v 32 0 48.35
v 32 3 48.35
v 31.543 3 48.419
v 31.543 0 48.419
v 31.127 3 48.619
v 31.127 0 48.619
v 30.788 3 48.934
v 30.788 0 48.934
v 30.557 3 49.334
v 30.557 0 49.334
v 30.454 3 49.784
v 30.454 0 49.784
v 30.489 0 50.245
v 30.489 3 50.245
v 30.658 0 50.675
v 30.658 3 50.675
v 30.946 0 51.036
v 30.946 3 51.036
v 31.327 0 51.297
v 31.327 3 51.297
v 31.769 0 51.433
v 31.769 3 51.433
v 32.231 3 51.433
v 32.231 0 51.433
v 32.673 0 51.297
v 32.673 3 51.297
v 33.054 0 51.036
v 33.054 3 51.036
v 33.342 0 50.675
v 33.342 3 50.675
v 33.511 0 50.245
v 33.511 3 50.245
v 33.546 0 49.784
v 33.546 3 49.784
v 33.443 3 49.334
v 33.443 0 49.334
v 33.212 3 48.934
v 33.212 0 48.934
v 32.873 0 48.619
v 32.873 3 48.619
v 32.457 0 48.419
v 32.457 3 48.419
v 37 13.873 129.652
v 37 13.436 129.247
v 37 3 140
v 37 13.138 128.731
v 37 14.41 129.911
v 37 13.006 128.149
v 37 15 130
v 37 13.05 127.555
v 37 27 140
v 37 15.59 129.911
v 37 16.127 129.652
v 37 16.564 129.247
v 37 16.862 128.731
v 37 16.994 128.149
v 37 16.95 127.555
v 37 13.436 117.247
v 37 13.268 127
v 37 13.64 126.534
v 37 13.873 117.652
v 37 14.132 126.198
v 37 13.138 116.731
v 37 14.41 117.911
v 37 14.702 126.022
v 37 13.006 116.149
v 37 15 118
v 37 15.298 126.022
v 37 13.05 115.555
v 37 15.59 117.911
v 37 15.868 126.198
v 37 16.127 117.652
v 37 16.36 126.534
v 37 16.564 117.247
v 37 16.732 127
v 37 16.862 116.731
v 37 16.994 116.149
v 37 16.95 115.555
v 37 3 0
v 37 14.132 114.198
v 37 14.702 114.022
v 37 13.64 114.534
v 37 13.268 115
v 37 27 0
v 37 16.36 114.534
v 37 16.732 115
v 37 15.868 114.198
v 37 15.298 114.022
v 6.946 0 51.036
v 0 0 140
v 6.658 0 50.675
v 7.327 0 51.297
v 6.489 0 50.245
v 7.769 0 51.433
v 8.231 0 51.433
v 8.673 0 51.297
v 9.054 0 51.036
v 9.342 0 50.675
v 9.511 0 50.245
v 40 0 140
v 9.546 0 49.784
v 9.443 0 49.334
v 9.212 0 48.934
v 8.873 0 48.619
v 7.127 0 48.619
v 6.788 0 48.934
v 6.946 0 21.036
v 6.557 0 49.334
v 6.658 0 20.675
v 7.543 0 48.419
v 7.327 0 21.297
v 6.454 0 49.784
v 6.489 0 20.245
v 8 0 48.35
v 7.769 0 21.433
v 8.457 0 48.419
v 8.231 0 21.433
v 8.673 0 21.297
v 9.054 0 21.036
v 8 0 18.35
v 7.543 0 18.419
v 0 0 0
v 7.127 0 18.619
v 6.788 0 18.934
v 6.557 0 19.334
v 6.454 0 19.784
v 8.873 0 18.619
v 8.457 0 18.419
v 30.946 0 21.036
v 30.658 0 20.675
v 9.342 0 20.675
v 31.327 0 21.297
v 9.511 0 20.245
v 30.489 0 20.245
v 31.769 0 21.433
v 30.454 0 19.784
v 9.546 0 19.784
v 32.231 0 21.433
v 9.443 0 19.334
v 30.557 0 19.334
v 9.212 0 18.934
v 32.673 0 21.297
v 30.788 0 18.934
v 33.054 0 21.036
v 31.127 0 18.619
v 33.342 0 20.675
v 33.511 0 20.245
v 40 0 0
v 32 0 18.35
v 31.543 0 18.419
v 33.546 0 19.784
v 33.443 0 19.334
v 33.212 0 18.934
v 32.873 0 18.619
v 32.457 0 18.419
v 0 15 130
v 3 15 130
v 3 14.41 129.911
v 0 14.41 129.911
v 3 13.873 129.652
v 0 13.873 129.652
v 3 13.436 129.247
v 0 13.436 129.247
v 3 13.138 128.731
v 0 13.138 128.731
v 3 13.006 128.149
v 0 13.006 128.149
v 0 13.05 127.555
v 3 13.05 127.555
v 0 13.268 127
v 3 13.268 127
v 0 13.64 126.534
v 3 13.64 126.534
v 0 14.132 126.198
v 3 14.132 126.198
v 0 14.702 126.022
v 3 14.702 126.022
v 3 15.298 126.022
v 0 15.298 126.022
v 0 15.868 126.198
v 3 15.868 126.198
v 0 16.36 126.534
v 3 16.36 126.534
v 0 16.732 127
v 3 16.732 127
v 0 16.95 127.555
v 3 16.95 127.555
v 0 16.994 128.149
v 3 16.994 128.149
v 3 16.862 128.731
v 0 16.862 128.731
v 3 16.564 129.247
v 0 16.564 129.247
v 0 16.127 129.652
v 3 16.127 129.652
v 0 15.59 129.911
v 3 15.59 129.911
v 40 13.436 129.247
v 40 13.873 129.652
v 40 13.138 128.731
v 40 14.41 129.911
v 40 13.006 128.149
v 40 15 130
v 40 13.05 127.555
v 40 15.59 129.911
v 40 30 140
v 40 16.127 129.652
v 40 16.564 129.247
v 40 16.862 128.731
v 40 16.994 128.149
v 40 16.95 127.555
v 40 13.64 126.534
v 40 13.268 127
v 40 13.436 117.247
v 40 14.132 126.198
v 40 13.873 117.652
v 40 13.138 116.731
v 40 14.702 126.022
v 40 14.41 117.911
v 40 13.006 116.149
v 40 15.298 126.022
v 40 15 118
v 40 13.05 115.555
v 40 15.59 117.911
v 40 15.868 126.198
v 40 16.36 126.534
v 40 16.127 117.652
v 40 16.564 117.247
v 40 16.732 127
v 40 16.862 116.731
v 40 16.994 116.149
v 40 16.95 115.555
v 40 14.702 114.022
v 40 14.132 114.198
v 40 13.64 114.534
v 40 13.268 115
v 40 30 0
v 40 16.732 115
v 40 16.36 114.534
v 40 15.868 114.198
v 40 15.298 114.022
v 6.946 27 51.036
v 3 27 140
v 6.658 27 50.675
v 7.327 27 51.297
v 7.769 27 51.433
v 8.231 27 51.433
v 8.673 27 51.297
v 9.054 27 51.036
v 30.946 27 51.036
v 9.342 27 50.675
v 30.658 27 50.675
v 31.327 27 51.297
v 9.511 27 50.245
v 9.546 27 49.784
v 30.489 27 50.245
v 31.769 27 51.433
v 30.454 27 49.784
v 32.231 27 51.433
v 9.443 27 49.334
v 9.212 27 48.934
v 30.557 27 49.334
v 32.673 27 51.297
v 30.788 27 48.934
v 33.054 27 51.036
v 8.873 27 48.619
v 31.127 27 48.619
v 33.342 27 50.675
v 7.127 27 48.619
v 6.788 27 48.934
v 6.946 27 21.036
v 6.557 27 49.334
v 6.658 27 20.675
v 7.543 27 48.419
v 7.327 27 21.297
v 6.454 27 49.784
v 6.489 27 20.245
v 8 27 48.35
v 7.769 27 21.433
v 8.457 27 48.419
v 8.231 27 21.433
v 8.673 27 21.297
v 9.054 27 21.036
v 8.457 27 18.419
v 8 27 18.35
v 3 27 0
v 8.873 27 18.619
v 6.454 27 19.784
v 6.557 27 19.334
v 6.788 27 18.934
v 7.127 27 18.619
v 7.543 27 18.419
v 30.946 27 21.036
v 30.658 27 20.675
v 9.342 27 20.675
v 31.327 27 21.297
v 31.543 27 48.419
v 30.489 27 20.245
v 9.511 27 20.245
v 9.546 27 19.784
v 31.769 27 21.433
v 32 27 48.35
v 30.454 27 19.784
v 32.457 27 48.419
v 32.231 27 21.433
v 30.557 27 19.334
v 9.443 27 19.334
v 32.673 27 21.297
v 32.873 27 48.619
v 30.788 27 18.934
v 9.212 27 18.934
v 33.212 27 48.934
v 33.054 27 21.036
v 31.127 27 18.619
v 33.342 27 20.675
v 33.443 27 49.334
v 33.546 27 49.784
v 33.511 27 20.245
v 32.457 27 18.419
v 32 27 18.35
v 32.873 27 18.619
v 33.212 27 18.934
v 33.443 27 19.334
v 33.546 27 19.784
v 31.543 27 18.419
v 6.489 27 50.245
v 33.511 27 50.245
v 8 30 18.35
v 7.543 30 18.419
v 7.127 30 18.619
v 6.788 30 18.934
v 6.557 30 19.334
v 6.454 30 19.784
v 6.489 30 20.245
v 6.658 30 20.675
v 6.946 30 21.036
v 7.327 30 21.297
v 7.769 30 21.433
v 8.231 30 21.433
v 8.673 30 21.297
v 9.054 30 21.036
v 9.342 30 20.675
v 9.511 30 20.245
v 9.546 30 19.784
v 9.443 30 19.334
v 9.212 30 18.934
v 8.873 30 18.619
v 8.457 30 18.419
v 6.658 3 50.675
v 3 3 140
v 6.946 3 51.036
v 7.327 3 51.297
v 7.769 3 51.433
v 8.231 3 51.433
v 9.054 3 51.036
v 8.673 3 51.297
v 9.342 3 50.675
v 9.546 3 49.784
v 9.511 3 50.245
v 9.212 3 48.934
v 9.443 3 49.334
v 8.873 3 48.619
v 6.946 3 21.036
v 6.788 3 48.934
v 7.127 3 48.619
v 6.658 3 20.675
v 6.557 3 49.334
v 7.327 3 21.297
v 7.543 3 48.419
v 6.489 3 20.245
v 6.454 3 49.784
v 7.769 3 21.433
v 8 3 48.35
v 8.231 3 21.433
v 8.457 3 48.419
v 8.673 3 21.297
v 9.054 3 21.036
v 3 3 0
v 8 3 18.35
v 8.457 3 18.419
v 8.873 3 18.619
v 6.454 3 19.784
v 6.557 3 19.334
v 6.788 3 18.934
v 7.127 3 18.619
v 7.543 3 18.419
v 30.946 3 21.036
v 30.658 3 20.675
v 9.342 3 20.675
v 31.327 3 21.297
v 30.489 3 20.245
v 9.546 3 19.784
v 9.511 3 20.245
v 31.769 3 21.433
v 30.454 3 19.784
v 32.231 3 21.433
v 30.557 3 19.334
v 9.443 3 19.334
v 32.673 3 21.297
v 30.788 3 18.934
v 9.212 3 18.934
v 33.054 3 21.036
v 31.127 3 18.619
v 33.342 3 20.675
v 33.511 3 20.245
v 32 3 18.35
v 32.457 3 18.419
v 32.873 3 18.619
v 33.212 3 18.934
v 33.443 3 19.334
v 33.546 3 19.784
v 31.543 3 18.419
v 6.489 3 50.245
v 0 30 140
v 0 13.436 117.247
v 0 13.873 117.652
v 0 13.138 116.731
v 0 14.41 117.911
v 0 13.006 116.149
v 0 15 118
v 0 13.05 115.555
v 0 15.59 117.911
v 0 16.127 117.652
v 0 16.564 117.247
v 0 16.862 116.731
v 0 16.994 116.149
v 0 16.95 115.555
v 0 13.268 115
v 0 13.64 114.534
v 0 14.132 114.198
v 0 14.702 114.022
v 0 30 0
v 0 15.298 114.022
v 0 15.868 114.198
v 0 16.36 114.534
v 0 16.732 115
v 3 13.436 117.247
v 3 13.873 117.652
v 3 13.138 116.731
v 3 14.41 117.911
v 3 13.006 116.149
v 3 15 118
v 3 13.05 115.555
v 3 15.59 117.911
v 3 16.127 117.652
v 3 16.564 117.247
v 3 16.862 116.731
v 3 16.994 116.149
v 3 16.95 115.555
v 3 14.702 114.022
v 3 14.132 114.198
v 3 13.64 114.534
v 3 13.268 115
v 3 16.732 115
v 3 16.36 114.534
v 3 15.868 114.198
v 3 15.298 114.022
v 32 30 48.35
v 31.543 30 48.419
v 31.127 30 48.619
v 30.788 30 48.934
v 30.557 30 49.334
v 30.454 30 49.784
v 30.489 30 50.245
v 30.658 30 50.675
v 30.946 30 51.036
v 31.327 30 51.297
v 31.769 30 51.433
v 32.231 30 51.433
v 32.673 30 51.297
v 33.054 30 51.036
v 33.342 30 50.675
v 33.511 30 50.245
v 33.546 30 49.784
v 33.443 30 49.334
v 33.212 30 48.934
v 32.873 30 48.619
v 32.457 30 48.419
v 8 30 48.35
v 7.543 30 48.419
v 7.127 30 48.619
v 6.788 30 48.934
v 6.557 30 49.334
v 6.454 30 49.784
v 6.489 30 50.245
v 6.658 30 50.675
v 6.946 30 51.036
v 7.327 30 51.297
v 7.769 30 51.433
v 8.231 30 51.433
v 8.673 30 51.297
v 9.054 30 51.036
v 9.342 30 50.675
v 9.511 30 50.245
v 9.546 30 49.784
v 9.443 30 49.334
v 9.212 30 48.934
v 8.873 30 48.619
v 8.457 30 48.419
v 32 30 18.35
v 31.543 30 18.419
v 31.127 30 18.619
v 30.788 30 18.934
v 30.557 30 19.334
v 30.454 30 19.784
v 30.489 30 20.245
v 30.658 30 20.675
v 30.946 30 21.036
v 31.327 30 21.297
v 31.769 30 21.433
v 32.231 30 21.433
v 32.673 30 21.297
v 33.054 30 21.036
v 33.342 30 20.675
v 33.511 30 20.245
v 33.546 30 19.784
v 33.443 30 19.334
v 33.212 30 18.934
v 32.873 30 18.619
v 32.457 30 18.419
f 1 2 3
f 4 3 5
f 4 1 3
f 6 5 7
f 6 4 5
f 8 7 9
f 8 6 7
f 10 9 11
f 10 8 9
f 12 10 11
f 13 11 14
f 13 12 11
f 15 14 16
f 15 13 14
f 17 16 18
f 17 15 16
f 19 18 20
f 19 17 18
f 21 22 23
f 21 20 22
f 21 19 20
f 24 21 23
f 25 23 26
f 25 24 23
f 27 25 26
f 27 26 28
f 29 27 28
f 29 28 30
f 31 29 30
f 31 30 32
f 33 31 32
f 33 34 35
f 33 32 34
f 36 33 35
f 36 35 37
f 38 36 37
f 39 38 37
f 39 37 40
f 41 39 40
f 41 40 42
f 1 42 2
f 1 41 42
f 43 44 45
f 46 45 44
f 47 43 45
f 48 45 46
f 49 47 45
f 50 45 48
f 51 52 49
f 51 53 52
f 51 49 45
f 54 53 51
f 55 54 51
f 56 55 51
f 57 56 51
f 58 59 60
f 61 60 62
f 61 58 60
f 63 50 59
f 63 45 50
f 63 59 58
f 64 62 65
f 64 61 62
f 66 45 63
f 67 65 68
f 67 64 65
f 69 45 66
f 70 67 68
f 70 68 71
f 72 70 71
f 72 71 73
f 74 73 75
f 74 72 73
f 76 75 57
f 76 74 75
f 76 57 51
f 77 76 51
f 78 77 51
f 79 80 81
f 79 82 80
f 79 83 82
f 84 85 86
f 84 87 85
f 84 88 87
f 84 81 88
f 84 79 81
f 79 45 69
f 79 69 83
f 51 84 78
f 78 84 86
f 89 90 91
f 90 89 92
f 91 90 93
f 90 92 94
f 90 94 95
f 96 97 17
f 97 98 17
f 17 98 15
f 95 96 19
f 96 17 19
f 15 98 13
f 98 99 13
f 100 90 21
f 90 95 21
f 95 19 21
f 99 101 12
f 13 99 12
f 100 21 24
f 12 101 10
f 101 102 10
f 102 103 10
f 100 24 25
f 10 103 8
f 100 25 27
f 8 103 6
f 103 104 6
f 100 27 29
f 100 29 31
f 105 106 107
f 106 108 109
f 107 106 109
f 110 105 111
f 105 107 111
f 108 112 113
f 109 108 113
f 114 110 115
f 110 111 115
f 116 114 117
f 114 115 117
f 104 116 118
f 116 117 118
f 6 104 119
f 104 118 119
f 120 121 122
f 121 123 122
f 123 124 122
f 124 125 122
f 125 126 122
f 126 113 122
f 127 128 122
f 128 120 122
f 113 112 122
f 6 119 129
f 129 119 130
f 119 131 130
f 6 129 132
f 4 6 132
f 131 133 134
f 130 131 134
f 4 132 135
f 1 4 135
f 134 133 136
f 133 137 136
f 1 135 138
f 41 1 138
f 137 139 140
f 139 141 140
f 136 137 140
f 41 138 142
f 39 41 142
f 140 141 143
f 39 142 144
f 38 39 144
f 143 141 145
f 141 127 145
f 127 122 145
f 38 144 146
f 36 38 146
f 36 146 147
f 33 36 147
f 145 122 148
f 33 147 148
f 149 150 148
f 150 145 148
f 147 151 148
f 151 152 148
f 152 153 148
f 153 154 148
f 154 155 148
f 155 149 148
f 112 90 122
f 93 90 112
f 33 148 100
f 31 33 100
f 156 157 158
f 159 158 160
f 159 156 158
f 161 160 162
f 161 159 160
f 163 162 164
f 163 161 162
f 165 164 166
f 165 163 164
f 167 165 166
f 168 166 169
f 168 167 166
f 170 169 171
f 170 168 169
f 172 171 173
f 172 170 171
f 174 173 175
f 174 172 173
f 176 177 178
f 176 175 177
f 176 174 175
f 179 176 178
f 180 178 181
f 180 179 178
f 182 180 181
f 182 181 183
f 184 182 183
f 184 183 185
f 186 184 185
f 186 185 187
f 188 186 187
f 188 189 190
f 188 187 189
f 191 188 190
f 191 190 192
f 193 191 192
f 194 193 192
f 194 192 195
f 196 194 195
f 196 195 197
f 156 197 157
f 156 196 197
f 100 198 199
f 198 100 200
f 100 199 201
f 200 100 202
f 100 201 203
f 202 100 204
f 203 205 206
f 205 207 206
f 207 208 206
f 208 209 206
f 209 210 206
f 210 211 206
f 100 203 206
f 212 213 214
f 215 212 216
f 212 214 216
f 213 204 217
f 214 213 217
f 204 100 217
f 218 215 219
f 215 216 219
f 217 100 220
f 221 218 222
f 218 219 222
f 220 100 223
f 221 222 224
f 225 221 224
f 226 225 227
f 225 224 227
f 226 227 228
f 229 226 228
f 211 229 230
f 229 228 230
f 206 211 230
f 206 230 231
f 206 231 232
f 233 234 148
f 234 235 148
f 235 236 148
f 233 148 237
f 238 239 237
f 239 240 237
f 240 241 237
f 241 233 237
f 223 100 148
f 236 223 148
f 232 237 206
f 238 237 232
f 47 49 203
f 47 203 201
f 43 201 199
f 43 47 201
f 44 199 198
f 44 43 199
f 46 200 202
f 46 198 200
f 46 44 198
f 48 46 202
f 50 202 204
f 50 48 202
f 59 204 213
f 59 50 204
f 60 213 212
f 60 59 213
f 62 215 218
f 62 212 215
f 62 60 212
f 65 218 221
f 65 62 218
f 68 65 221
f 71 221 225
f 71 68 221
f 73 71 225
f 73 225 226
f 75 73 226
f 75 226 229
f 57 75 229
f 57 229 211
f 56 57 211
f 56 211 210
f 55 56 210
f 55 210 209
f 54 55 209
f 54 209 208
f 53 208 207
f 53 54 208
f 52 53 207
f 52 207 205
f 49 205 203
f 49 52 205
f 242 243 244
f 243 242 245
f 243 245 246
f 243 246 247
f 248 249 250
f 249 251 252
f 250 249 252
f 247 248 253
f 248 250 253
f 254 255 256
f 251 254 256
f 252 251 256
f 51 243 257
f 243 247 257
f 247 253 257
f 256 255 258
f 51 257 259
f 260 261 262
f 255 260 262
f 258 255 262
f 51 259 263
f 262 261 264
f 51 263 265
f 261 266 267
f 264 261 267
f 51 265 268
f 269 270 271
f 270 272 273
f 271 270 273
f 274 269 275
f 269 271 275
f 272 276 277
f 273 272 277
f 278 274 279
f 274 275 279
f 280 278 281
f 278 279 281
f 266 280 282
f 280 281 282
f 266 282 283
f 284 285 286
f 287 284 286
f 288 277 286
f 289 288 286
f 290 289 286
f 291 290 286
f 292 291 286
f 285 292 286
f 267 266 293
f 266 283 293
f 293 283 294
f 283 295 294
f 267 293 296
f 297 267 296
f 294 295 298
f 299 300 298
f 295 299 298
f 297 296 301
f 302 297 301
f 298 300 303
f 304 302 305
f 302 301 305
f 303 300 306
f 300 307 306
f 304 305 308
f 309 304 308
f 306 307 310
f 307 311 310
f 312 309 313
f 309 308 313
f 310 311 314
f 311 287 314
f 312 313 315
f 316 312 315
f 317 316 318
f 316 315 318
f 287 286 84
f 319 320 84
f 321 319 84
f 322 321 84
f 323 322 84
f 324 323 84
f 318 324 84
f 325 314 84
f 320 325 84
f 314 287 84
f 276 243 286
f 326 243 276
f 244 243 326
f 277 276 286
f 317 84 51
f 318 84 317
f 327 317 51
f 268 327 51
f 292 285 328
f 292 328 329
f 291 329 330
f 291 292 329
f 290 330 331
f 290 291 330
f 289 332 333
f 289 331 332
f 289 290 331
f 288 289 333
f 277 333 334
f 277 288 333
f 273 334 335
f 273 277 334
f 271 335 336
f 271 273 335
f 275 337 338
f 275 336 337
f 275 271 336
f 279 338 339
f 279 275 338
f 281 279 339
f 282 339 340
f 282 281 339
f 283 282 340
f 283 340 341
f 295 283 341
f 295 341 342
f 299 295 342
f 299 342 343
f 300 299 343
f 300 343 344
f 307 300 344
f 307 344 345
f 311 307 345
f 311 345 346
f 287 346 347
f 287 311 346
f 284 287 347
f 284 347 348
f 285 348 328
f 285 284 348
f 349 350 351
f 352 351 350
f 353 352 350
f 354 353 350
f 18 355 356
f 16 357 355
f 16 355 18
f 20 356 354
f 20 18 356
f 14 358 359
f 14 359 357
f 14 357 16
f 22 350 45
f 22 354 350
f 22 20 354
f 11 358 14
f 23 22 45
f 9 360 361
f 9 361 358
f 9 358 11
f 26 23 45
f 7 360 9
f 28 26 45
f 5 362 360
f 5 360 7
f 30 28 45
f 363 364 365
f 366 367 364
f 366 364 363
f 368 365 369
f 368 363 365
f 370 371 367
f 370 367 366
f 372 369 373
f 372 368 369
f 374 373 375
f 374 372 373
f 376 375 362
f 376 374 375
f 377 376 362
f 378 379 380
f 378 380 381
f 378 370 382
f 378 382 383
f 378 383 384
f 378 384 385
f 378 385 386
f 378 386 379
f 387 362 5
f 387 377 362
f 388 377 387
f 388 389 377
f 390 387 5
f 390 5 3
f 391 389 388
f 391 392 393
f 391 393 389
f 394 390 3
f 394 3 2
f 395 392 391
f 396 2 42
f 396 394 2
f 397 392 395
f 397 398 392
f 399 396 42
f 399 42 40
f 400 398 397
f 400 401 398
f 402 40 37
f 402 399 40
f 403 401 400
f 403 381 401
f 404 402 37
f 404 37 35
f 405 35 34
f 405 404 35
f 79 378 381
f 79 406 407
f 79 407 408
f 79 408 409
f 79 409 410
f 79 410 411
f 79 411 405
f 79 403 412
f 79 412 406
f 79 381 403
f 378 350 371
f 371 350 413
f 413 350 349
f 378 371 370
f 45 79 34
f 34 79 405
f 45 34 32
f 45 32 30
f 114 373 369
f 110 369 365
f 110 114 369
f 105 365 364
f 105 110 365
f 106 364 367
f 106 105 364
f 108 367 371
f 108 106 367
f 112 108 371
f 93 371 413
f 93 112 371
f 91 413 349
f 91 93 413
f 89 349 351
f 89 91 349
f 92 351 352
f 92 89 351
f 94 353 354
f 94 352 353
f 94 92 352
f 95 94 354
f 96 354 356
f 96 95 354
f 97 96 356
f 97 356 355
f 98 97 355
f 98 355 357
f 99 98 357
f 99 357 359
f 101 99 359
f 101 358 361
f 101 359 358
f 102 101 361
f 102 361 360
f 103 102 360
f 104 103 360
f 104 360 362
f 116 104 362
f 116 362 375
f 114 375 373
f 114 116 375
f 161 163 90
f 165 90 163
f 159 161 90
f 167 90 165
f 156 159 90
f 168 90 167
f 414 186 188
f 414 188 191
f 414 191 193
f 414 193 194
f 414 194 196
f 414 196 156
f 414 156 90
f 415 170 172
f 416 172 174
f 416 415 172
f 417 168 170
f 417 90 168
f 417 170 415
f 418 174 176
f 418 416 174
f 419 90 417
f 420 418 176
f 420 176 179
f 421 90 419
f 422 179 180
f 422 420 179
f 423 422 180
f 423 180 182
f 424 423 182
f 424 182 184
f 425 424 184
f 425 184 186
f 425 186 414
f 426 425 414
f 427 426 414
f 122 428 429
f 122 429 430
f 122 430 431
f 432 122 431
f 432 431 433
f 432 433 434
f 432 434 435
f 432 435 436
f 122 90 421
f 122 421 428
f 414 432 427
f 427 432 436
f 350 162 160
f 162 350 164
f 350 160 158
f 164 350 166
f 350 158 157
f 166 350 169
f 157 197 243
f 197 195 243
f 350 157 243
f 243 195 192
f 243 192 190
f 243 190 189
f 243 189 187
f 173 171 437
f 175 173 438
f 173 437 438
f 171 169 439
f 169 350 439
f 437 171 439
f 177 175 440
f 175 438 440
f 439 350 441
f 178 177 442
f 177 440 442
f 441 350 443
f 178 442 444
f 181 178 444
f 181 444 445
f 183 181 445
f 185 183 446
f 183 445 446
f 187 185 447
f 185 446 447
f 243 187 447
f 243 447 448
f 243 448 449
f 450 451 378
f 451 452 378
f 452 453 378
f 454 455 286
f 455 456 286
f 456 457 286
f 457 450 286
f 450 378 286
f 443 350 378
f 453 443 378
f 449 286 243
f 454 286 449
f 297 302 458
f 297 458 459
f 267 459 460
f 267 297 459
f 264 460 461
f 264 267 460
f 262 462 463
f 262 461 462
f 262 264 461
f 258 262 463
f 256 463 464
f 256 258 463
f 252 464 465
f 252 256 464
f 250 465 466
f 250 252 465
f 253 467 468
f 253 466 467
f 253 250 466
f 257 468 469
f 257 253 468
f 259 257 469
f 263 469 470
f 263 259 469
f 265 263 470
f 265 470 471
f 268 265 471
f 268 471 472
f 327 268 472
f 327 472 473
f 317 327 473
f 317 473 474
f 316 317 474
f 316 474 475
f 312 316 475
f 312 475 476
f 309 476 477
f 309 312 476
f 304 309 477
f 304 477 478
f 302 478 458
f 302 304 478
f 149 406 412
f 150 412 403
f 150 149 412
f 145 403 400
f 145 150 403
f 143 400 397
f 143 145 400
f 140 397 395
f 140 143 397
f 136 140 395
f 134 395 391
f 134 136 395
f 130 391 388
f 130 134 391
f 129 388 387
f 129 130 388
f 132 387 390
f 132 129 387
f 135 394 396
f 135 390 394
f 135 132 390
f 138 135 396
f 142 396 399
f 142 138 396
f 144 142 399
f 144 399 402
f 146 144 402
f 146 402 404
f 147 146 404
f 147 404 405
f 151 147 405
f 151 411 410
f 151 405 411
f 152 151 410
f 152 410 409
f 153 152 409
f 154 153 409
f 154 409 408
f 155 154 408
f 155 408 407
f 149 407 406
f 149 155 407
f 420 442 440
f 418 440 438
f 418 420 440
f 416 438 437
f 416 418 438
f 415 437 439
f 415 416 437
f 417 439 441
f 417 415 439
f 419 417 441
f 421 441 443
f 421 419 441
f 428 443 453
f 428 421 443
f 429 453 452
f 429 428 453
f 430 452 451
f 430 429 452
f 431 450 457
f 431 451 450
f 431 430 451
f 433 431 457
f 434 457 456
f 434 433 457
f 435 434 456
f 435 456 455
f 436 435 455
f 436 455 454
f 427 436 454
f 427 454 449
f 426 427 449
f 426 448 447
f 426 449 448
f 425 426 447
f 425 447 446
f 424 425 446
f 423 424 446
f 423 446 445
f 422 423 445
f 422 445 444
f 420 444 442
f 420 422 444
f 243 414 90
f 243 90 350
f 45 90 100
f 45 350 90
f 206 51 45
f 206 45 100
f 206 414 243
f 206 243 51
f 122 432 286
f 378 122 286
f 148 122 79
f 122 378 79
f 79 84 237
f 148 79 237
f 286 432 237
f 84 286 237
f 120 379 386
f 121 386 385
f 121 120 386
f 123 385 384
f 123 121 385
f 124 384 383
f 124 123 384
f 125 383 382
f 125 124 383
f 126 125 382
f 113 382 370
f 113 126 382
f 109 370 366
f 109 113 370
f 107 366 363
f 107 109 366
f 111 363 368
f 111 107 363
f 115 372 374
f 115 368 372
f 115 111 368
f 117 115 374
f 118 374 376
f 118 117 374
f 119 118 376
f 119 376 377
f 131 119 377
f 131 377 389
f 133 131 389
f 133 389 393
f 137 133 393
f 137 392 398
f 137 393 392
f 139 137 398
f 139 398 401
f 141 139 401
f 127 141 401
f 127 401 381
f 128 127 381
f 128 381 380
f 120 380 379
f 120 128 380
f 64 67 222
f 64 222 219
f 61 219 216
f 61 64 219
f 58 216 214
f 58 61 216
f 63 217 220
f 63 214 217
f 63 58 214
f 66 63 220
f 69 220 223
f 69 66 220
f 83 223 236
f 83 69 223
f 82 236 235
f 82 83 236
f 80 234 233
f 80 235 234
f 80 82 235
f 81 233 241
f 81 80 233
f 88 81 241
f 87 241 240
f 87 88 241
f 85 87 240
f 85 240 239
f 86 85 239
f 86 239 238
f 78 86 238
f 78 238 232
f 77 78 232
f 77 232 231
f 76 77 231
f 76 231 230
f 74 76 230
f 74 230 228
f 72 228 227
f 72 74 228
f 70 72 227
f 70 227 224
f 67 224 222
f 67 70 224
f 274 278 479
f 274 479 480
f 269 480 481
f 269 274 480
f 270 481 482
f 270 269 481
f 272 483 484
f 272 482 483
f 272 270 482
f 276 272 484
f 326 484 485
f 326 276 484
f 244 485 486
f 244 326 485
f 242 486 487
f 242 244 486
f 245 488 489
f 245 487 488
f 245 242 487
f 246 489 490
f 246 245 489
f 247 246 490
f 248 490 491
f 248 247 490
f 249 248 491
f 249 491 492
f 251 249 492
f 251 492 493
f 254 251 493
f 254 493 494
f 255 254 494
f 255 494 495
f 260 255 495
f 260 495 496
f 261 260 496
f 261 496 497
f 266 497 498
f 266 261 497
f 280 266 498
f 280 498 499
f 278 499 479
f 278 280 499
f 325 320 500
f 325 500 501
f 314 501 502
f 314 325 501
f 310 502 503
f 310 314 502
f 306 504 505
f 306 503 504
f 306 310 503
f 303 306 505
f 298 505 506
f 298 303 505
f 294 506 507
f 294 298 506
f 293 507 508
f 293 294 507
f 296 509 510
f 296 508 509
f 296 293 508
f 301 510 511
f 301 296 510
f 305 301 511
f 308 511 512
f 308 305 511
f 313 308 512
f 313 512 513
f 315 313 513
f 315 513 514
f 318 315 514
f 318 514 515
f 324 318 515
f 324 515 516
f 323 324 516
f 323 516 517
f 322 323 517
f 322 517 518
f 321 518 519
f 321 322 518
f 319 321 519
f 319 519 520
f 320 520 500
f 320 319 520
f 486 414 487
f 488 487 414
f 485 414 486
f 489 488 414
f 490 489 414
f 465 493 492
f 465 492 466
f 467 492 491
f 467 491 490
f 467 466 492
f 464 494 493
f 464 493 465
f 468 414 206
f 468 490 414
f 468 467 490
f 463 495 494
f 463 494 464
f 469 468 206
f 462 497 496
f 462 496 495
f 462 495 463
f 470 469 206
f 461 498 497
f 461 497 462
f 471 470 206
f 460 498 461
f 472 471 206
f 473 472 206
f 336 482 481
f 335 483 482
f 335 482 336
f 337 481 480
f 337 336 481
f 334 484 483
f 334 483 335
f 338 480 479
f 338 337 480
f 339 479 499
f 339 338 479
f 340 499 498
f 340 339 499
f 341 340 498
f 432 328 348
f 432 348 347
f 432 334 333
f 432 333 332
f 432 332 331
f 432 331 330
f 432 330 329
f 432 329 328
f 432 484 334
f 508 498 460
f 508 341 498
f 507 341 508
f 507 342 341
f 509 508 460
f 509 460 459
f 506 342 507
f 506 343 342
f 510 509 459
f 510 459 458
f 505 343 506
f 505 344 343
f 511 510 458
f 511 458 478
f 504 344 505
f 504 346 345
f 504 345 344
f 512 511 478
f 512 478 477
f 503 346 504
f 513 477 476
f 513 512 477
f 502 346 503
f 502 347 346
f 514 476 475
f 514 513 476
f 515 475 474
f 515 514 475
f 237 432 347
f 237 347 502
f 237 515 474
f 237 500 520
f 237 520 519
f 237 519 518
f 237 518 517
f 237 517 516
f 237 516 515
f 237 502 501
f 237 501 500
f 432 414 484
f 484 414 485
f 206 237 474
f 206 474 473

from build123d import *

# Parameters (mm, degrees)
SKETCH_1_W          = 40
SKETCH_1_H          = 30
SKETCH_1_W_2        = 34
SKETCH_1_H_2        = 24
EXTRUDE_1_DEPTH     = 140
SKETCH_2_R          = 2
CUT_EXTRUDE_1_DEPTH = 149.660687473
SKETCH_3_R          = 1.55
CUT_EXTRUDE_2_DEPTH = 149.660687473


with BuildPart() as part:
    # 草图1 → 凸台-拉伸1 (new body)
    with BuildSketch(Plane.XY):
        with Locations((20, 15)):
            Rectangle(SKETCH_1_W, SKETCH_1_H)
        with Locations((20, 15)):
            Rectangle(SKETCH_1_W_2, SKETCH_1_H_2, mode=Mode.SUBTRACT)
    extrude(amount=EXTRUDE_1_DEPTH)

    # 草图2 → 切除-拉伸1 (cut, through all)
    with BuildSketch(Plane(origin=(0, 0, 0), x_dir=(0, 0, -1), z_dir=(1, 0, 0))):
        with Locations(Location((-116, 15, 0), (0, 0, 180))):
            Circle(SKETCH_2_R)
        with Locations(Location((-128, 15, 0), (0, 0, 180))):
            Circle(SKETCH_2_R)
    extrude(amount=CUT_EXTRUDE_1_DEPTH, mode=Mode.SUBTRACT)

    # 草图3 → 切除-拉伸2 (cut, through all)
    with BuildSketch(Plane(origin=(0, 0, 0), x_dir=(1, 0, 0), z_dir=(0, 1, 0))):
        with Locations(Location((8, -19.9, 0), (0, 0, 90))):
            Circle(SKETCH_3_R)
        with Locations(Location((32, -19.9, 0), (0, 0, 90))):
            Circle(SKETCH_3_R)
        with Locations(Location((32, -49.9, 0), (0, 0, 90))):
            Circle(SKETCH_3_R)
        with Locations(Location((8, -49.9, 0), (0, 0, 90))):
            Circle(SKETCH_3_R)
    extrude(amount=CUT_EXTRUDE_2_DEPTH, mode=Mode.SUBTRACT)


solid = part.part
